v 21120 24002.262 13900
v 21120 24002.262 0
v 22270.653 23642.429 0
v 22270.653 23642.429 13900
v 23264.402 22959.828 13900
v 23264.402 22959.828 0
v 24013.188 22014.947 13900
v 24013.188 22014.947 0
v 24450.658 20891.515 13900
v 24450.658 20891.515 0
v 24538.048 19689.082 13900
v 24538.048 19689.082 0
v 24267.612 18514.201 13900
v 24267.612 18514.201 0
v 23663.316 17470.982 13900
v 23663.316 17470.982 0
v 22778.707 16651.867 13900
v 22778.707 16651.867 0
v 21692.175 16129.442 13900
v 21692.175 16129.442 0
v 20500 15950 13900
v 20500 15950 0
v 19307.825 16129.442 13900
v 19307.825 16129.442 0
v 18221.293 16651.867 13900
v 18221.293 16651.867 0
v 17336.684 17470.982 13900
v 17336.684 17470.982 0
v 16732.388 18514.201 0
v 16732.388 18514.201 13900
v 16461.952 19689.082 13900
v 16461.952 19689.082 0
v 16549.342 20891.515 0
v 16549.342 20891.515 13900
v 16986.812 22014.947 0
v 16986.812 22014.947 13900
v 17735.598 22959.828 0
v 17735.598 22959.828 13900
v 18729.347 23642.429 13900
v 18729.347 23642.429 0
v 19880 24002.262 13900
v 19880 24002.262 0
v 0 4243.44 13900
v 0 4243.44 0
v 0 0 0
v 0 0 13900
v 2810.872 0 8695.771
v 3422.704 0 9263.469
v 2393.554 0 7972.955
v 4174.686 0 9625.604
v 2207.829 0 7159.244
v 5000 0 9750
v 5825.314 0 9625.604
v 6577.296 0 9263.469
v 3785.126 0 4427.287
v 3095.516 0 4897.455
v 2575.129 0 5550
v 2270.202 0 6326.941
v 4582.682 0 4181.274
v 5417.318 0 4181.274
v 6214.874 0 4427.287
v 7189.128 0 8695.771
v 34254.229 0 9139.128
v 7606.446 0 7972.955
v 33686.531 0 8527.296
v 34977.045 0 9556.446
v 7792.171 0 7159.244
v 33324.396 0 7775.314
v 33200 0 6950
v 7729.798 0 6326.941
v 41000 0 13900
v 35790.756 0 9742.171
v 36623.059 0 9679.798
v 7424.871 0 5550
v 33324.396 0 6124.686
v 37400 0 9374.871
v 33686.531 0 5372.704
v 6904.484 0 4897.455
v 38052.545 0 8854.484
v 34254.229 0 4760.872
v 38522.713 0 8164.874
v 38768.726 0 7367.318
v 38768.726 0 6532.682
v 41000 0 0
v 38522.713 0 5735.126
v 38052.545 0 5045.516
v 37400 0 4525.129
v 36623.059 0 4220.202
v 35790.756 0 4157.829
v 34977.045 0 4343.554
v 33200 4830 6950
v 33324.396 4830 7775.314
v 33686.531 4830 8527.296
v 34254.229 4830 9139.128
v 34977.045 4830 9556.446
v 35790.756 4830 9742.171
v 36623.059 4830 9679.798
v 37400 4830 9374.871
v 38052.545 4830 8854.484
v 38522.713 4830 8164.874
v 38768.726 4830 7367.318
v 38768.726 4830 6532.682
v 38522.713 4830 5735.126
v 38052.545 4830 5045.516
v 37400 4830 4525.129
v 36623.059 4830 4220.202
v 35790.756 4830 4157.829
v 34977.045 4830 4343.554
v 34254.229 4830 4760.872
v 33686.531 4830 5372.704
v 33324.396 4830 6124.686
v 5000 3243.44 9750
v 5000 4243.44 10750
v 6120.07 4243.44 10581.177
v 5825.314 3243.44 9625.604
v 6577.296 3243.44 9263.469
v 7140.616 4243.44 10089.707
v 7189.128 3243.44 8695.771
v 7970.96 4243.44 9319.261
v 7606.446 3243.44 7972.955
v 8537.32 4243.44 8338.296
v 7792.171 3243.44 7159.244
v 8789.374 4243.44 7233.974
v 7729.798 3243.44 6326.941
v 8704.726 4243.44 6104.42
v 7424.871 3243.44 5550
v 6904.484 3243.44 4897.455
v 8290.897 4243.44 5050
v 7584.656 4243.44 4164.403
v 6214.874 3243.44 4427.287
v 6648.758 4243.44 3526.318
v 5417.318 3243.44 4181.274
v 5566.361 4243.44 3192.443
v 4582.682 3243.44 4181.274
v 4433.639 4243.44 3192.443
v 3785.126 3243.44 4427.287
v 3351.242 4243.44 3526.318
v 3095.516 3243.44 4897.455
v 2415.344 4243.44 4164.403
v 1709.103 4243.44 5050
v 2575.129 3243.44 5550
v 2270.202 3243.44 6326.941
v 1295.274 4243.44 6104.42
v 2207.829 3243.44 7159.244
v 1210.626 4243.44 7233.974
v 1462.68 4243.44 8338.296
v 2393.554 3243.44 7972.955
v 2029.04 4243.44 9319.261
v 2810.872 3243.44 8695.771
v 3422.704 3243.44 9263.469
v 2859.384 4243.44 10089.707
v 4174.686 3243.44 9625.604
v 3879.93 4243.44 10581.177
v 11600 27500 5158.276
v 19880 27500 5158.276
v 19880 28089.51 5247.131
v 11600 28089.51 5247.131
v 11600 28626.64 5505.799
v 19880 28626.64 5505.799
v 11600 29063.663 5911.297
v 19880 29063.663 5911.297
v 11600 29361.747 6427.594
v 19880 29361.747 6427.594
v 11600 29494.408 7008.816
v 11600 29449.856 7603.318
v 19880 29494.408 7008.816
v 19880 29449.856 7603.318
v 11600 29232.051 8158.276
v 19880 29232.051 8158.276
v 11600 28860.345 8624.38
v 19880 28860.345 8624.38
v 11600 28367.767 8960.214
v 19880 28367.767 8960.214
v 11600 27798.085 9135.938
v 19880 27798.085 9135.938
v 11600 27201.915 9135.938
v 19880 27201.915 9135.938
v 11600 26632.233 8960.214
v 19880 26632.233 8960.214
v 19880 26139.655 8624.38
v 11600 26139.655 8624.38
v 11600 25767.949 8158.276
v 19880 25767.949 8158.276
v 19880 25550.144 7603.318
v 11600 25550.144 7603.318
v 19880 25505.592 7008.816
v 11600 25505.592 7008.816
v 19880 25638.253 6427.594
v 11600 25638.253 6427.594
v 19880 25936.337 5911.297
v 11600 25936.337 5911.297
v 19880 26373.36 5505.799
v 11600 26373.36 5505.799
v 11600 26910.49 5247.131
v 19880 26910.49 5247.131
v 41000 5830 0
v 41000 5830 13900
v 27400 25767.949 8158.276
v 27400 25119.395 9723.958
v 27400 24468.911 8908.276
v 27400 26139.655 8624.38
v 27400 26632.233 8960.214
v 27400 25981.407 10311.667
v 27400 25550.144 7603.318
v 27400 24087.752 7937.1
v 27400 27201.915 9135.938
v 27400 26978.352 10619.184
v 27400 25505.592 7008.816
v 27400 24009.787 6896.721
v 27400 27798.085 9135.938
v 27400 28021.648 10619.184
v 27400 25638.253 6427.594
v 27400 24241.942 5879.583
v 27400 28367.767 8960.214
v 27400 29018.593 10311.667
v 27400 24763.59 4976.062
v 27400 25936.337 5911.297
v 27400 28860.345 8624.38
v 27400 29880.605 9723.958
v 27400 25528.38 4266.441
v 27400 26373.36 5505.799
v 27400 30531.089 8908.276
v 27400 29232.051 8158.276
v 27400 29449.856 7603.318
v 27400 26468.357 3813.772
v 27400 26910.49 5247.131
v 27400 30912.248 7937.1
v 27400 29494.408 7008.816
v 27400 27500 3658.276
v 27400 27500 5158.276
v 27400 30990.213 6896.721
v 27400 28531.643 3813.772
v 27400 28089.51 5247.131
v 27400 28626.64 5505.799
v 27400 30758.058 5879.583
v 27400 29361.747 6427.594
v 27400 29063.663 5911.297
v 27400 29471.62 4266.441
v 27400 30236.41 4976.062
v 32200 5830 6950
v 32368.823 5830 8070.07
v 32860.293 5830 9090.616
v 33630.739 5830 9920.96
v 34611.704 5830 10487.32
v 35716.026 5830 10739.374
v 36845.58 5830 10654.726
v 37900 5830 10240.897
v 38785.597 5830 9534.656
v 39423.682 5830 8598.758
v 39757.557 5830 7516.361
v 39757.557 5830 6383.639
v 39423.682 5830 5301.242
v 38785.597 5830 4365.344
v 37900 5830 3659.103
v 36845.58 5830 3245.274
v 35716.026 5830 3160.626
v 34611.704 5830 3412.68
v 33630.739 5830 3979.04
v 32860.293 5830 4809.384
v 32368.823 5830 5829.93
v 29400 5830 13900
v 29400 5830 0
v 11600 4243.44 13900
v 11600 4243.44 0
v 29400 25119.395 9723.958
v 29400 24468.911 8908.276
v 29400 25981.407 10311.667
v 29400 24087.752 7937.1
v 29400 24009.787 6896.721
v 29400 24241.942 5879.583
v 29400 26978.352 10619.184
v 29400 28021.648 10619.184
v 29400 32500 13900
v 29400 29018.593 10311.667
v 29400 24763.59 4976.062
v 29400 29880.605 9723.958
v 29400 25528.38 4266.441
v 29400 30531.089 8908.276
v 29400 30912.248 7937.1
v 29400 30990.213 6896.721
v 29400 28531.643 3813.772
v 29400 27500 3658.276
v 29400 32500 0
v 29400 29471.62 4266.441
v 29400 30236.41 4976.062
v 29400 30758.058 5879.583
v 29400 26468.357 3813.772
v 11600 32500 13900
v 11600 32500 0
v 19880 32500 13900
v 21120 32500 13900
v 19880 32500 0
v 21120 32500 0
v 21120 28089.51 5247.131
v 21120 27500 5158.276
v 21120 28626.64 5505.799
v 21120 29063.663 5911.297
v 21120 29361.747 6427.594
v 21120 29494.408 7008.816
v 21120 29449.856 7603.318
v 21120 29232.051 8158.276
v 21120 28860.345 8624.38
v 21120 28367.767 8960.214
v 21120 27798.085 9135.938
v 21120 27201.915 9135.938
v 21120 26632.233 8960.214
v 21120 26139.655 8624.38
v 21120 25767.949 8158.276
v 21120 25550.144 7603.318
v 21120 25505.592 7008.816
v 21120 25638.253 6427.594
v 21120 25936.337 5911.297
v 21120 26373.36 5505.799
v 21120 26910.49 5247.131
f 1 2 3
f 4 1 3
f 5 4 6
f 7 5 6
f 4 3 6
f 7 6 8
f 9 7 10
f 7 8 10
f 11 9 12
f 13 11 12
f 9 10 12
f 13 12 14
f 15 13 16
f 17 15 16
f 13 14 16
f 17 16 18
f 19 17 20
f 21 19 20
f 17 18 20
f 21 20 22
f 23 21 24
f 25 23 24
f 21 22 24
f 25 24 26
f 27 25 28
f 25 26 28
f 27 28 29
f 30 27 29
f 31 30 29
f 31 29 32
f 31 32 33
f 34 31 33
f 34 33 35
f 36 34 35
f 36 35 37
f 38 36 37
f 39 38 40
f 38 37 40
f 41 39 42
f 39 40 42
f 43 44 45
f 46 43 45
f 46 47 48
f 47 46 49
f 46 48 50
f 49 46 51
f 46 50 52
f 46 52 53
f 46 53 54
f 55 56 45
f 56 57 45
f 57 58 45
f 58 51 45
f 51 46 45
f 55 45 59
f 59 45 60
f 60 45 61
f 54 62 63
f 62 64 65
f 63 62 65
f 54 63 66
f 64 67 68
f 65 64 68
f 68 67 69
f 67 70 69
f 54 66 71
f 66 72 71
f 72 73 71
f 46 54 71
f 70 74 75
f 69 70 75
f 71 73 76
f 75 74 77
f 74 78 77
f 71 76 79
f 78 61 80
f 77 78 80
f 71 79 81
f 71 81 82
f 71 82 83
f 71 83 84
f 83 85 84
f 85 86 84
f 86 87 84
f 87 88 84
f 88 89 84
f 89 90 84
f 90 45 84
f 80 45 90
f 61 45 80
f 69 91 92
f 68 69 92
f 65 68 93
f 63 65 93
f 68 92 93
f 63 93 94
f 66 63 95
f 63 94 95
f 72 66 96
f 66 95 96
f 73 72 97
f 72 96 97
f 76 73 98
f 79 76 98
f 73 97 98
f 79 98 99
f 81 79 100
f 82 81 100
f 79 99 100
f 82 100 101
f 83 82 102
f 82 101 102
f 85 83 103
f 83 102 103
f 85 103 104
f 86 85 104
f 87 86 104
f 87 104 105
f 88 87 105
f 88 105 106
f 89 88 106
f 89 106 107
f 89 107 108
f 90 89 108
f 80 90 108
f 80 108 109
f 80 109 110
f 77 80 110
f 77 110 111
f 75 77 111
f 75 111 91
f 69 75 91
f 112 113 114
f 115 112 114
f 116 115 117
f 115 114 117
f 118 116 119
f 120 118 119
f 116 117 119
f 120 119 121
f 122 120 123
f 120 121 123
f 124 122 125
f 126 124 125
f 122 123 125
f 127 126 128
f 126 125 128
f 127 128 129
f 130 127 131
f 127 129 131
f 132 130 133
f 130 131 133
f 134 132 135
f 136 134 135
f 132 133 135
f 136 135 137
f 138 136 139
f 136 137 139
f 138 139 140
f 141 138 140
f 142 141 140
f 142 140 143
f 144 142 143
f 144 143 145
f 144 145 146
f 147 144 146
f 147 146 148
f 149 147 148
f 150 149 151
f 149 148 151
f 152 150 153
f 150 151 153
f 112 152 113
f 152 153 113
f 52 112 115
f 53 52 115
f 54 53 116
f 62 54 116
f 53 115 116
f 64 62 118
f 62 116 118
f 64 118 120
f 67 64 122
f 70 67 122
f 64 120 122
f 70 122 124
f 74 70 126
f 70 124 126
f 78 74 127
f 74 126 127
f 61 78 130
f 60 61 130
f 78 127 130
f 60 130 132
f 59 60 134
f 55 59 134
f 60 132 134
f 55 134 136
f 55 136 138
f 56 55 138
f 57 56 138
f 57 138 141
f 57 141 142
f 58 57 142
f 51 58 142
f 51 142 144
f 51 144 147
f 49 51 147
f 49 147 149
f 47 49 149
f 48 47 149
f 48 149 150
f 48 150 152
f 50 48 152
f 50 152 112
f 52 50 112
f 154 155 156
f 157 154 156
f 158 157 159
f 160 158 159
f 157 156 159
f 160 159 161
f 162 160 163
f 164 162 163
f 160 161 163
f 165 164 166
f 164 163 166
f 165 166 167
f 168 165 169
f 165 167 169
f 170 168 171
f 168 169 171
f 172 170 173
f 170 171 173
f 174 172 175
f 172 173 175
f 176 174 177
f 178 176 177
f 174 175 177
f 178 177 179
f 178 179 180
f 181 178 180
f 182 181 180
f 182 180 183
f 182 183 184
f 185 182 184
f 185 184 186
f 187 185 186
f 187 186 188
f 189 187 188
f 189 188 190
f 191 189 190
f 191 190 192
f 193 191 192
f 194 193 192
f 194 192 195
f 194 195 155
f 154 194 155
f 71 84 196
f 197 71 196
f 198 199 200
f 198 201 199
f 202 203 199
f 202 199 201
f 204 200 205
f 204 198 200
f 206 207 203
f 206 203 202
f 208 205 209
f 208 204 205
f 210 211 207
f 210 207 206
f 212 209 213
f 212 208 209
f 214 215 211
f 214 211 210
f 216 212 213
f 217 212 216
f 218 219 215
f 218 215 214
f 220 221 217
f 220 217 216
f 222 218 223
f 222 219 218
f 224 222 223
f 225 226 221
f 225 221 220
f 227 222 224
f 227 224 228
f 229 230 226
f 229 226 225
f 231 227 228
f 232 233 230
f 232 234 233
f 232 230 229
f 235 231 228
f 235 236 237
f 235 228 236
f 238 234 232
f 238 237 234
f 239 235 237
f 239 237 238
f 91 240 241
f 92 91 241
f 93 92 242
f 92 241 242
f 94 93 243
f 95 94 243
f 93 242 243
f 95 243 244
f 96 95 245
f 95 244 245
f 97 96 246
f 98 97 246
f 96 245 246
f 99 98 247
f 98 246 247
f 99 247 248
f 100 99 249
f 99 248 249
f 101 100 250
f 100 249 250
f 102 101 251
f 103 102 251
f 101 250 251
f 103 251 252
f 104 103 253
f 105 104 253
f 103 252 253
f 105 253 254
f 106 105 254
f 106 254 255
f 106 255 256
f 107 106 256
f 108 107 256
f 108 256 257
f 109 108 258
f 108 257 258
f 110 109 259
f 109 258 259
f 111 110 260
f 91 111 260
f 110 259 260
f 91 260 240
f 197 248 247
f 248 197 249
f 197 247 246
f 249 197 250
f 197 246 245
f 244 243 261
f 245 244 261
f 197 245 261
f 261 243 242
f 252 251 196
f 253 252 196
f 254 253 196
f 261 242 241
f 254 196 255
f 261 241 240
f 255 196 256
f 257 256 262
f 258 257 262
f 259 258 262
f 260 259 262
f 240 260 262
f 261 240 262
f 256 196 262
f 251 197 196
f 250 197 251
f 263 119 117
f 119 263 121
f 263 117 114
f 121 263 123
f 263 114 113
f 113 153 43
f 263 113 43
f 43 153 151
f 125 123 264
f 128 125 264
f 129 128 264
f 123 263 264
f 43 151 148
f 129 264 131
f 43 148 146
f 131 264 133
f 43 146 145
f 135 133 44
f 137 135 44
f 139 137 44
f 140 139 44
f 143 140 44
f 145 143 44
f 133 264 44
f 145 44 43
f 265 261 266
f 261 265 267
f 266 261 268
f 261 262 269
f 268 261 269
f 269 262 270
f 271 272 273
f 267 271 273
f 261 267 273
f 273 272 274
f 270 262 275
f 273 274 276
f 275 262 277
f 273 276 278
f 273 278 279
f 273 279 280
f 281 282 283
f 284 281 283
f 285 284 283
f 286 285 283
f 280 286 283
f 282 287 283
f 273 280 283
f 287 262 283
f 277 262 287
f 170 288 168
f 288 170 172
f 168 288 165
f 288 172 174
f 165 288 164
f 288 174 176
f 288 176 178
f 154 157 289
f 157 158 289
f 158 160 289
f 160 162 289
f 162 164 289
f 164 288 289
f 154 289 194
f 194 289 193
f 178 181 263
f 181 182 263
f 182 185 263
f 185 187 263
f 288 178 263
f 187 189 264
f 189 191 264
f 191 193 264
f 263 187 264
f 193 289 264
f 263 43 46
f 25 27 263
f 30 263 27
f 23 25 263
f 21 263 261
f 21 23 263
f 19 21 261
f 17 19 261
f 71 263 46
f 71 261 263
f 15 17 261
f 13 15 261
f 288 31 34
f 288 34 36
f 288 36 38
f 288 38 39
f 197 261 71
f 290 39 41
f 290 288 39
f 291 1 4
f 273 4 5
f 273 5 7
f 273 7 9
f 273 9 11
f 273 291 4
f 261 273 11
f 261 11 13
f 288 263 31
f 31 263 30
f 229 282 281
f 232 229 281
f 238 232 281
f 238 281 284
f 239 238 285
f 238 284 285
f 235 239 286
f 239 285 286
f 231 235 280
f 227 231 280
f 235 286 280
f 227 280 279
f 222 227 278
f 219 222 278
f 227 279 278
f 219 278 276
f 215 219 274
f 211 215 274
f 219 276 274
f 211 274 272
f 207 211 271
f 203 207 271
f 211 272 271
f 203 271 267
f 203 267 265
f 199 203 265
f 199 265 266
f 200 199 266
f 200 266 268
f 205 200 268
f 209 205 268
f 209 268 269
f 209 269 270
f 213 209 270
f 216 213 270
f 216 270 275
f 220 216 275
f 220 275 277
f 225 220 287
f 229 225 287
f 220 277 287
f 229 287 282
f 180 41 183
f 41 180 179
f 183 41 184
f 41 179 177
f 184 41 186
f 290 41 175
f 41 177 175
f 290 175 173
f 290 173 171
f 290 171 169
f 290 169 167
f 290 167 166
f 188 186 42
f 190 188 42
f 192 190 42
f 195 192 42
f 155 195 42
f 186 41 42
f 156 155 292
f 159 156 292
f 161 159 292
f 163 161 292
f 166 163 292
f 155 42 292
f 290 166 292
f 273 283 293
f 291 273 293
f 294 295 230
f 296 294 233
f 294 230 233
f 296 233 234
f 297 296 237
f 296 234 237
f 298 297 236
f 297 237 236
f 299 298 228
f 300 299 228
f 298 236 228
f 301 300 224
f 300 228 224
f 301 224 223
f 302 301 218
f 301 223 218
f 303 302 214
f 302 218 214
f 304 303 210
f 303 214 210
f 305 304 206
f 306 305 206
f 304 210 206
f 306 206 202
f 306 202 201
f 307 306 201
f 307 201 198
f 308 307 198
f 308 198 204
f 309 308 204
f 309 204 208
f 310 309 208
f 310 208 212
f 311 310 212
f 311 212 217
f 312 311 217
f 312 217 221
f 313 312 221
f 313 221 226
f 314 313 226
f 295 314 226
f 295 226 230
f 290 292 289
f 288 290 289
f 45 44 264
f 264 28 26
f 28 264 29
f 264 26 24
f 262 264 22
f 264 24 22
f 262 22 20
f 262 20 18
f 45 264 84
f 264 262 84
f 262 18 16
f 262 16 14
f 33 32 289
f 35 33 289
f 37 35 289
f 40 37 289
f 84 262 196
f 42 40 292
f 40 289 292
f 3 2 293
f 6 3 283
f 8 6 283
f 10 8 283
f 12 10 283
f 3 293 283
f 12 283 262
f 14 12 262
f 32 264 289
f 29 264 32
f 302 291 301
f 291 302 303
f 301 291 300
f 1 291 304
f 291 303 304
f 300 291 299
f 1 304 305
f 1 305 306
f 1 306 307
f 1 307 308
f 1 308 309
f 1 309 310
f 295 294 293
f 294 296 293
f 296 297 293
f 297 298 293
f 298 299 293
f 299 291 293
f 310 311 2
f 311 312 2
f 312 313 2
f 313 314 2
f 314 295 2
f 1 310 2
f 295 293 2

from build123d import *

# Parameters (mm, degrees)
EXTRUDE_1_DEPTH     = 13900
SKETCH_2_R          = 2800
CUT_EXTRUDE_1_DEPTH = 13900
CHAMFER_1_SIZE      = 1000
SKETCH_3_R          = 3500
CUT_EXTRUDE_3_DEPTH = 2000
SKETCH_10_R         = 2000
CUT_EXTRUDE_4_DEPTH = 24538


with BuildPart() as part:
    # 草圖1 → 填料-伸長1 (new body)
    with BuildSketch(Plane.XY):
        with BuildLine():
            Line((0, 0), (41000, 0))
            Line((41000, 0), (41000, 5830))
            Line((41000, 5830), (29400, 5830))
            Line((29400, 5830), (29400, 32500))
            Line((29400, 32500), (21120, 32500))
            Line((21120, 32500), (21120, 24002.261860498))
            ThreePointArc((21120, 24002.261860498), (20500, 15950), (19880, 24002.261860498))
            Line((19880, 24002.261860498), (19880, 32500))
            Line((19880, 32500), (11600, 32500))
            Line((11600, 32500), (11600, 4243.440233236))
            Line((11600, 4243.440233236), (0, 4243.440233236))
            Line((0, 4243.440233236), (0, 0))
        make_face()
    extrude(amount=EXTRUDE_1_DEPTH)

    # 草圖2 → 除料-伸長1 (cut)
    with BuildSketch(Plane(origin=(0, 5830, 0), x_dir=(1, 0, 0), z_dir=(0, 1, 0))):
        with Locations(Location((36000, -6950, 0), (0, 0, 180))):
            Circle(SKETCH_2_R)
        with Locations(Location((5000, -6950, 0), (0, 0, 270))):
            Circle(SKETCH_2_R)
    extrude(amount=-CUT_EXTRUDE_1_DEPTH, mode=Mode.SUBTRACT)

    # 導角1
    chamfer_1_edges = [part.edges().sort_by_distance(p)[0] for p in [
        (38800, 5830, 6950),
        (5000, 4243.440233236, 4150),
    ]]
    chamfer(chamfer_1_edges, length=CHAMFER_1_SIZE)

    # 草圖3 → 除料-伸長3 (cut)
    with BuildSketch(Plane(origin=(29400, 0, 0), x_dir=(0, 0, -1), z_dir=(1, 0, 0))):
        with Locations((-7158.276347715, 27500)):
            Circle(SKETCH_3_R)
    extrude(amount=-CUT_EXTRUDE_3_DEPTH, mode=Mode.SUBTRACT)

    # 草圖10 → 除料-伸長4 (cut)
    with BuildSketch(Plane(origin=(27400, 0, 0), x_dir=(0, 0, -1), z_dir=(1, 0, 0))):
        with Locations((-7158.276347715, 27500)):
            Circle(SKETCH_10_R)
    extrude(amount=-CUT_EXTRUDE_4_DEPTH, mode=Mode.SUBTRACT)


solid = part.part
